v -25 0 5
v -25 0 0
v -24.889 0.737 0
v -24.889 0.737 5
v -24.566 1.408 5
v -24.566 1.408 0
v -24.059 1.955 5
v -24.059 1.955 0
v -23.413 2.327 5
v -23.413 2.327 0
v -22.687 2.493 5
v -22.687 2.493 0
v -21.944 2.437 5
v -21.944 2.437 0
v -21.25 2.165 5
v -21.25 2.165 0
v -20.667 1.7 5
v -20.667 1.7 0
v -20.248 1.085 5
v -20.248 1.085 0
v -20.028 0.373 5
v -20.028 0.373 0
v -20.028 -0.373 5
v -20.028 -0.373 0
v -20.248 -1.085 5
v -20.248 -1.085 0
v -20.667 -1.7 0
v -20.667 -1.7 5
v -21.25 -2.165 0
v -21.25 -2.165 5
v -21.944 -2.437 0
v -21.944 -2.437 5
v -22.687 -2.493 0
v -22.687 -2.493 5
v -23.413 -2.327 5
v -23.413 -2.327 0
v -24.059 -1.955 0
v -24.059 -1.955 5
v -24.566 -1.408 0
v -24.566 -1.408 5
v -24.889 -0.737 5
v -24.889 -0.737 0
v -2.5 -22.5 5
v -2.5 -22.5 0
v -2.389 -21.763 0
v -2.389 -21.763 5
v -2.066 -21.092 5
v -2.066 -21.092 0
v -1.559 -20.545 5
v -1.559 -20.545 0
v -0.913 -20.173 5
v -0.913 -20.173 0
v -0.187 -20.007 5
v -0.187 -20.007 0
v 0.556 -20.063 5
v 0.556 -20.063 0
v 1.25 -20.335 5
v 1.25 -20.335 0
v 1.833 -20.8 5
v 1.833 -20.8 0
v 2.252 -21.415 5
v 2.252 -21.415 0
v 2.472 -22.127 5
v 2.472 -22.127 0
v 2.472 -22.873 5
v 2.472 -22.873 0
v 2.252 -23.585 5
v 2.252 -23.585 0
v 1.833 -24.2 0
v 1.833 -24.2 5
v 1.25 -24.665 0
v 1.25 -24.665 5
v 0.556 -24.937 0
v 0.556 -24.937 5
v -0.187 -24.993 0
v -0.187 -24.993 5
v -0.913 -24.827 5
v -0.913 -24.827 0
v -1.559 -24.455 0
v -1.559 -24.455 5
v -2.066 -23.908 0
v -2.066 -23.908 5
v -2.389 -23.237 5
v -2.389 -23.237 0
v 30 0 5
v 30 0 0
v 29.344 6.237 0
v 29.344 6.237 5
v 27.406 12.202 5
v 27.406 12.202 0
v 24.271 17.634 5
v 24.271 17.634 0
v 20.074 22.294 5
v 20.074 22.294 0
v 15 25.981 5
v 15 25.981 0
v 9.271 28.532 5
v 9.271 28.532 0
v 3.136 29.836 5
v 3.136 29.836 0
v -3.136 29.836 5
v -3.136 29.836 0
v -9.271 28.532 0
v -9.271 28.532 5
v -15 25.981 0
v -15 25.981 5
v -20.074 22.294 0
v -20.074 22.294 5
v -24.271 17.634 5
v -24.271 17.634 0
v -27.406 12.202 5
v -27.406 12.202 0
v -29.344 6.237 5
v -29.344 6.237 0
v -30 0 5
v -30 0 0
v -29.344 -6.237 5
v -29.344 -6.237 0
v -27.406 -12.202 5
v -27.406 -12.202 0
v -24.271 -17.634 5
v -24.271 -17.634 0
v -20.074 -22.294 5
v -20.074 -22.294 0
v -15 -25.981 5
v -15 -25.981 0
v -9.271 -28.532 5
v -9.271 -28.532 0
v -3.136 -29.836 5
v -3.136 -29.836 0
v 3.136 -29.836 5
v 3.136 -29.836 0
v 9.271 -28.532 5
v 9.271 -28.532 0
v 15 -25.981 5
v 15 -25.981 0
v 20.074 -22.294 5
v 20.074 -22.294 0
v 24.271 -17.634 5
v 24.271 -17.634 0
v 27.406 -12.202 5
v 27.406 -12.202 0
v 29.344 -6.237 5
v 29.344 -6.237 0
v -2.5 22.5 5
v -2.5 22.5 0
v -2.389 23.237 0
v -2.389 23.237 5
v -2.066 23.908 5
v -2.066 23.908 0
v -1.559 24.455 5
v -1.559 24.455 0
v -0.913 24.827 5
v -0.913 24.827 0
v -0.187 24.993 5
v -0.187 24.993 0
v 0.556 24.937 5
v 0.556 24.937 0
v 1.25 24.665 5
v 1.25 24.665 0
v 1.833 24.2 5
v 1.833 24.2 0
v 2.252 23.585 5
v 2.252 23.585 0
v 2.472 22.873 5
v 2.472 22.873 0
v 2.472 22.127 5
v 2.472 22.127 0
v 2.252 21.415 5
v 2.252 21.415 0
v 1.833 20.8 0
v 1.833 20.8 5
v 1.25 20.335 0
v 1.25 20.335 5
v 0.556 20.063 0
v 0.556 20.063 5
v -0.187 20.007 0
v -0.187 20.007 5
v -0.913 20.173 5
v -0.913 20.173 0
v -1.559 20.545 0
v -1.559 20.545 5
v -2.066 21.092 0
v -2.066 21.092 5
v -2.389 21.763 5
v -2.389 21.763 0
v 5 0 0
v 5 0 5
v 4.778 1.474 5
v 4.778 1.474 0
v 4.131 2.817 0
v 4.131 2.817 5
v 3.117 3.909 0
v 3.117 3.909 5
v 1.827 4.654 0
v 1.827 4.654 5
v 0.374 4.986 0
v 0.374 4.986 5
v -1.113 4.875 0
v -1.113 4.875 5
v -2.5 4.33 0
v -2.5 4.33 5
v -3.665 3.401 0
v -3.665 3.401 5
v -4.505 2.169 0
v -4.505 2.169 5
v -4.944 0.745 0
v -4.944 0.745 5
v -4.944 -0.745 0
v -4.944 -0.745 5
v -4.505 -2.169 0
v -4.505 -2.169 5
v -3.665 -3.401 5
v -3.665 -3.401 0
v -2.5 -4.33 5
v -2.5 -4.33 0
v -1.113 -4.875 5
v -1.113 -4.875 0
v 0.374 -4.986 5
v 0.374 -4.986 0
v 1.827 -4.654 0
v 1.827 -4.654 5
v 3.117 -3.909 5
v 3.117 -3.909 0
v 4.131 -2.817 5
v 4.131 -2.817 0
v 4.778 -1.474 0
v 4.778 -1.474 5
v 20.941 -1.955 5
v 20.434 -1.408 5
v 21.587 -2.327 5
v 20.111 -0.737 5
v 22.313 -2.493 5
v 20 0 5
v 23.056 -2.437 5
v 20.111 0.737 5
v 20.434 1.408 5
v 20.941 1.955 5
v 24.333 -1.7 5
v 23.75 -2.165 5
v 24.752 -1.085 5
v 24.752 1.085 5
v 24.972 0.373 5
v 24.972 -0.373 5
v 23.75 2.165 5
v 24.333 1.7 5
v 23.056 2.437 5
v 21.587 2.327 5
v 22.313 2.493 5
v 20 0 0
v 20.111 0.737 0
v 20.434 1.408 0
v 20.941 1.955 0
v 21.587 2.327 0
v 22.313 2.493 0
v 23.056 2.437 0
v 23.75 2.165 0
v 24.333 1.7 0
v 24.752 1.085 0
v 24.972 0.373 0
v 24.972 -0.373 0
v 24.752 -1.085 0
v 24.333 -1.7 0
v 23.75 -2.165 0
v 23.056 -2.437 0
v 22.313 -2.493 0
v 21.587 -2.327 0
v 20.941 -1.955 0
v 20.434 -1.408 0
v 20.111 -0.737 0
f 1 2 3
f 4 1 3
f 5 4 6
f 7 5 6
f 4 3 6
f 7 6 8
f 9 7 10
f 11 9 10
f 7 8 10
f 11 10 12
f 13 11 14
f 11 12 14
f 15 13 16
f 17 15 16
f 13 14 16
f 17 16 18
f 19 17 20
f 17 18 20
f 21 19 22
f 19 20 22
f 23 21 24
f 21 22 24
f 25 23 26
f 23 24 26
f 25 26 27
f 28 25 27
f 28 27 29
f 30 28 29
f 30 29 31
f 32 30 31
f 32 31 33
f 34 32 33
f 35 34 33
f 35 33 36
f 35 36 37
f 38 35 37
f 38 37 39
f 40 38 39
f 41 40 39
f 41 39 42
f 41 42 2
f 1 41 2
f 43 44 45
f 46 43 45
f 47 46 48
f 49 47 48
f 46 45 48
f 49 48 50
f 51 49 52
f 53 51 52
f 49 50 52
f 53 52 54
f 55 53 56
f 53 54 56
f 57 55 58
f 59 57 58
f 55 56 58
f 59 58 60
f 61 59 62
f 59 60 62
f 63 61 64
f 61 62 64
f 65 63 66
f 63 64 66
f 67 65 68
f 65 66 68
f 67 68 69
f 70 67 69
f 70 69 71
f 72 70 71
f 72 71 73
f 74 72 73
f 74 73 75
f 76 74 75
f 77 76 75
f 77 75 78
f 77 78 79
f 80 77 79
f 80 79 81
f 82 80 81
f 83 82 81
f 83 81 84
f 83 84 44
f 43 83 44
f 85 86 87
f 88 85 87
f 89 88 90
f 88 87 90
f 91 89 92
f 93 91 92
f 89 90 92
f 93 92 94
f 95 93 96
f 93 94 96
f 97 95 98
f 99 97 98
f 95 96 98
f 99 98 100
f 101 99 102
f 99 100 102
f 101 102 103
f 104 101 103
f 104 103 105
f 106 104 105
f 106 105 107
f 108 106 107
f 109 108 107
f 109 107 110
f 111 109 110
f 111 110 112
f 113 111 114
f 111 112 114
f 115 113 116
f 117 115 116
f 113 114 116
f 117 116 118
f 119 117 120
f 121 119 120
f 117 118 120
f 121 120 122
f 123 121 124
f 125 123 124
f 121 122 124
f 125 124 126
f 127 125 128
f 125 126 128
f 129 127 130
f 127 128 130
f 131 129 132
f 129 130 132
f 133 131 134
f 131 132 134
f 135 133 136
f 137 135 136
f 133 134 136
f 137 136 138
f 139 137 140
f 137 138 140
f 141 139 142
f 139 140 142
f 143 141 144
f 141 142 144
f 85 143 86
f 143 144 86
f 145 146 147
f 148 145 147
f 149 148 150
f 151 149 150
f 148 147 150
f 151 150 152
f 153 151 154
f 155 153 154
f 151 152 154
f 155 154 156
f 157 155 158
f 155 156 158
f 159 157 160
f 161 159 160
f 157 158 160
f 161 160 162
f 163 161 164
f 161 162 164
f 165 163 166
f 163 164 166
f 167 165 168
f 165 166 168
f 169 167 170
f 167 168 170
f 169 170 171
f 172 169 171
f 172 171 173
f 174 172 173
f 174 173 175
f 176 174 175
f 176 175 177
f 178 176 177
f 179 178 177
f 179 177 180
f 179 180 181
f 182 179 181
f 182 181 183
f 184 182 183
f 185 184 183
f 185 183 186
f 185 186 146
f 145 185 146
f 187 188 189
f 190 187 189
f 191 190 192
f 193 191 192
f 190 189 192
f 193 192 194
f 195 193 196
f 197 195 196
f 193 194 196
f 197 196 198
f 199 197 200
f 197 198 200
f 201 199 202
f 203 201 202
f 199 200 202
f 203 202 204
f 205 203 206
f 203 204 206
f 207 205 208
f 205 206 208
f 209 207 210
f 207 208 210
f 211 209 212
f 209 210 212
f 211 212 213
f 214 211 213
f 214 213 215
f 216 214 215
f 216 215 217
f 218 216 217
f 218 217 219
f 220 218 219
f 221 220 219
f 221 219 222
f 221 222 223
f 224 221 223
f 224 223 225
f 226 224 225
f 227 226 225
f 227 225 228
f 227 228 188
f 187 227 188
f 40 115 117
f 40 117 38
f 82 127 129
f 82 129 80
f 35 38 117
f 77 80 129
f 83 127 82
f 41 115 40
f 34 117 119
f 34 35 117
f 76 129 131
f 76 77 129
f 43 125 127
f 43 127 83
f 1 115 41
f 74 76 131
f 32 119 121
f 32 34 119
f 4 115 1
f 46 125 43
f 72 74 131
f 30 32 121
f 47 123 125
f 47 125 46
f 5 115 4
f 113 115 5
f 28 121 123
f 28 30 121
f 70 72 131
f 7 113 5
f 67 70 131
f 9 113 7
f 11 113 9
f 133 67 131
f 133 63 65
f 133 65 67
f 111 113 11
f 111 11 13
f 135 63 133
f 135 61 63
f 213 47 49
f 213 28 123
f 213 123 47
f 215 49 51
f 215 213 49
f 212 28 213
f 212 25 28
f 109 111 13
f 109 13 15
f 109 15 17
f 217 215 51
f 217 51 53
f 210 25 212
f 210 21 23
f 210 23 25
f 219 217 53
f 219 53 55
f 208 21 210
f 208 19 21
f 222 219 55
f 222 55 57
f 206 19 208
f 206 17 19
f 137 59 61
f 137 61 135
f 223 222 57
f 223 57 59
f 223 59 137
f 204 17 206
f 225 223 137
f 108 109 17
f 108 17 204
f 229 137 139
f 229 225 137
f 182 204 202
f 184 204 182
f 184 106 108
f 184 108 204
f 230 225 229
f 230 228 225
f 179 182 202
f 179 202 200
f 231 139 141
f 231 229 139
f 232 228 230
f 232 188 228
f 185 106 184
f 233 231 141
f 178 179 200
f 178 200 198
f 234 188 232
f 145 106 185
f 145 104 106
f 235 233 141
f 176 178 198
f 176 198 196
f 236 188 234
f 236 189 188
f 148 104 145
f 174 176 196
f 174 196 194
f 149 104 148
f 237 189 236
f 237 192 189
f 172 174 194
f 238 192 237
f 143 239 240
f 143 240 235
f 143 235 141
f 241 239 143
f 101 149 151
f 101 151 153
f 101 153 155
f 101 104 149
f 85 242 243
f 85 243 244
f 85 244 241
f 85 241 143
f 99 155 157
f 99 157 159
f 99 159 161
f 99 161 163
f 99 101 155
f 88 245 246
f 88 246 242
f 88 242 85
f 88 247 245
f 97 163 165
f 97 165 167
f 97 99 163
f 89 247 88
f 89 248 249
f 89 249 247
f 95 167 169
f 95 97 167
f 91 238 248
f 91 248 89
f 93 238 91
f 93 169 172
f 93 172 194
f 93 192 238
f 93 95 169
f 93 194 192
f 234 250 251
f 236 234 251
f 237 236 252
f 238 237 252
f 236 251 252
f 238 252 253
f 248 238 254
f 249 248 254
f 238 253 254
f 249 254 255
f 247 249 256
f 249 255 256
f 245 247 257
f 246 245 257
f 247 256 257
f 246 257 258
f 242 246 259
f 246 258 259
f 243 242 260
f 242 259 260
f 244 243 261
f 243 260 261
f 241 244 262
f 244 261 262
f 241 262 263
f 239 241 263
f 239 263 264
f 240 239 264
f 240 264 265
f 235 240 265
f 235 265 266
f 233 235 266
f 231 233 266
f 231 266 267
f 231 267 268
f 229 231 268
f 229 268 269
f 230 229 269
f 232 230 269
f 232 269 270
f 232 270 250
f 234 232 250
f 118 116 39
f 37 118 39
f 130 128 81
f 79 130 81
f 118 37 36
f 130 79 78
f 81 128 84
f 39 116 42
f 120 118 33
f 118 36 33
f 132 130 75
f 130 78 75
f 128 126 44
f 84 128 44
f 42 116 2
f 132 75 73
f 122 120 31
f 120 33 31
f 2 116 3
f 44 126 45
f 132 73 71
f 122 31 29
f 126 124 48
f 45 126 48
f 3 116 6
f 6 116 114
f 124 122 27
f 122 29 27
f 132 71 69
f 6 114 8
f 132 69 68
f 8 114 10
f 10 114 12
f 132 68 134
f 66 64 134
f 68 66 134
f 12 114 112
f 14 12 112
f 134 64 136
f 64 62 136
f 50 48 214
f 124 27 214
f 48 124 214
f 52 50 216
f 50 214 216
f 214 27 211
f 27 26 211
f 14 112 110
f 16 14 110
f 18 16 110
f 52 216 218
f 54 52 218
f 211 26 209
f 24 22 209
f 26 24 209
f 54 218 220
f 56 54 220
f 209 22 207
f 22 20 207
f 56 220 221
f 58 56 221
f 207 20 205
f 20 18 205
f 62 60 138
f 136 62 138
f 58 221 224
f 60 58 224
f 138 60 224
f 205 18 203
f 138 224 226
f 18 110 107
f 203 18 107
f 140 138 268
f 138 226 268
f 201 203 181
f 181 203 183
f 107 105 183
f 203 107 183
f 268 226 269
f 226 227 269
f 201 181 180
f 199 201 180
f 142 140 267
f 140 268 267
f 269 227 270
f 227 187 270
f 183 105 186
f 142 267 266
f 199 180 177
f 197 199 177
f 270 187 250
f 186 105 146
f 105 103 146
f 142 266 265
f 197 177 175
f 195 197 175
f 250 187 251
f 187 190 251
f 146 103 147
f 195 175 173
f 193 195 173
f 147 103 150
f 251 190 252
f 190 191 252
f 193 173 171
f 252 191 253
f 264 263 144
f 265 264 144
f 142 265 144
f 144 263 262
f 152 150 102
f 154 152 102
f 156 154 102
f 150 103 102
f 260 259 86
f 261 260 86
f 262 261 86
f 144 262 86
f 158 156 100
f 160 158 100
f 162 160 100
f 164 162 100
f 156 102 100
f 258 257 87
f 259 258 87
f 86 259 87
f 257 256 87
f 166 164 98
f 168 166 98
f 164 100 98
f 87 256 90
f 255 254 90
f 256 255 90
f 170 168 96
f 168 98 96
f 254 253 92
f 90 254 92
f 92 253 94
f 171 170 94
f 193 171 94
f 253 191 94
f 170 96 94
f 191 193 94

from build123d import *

# Parameters (mm, degrees)
SKETCH_1_R             = 30
EXTRUDE_1_DEPTH        = 5
SKETCH_2_R             = 5
CUT_EXTRUDE_1_DEPTH    = 93
HOLE_WIZARD_M6_1_D     = 5
HOLE_WIZARD_M6_1_DEPTH = 15
HOLE_WIZARD_M6_1_TIP   = 1.502151548


with BuildPart() as part:
    # 草图1 → 凸台-拉伸1 (new body)
    with BuildSketch(Plane.XY):
        Circle(SKETCH_1_R)
    extrude(amount=EXTRUDE_1_DEPTH)

    # 草图2 → 切除-拉伸1 (cut)
    with BuildSketch(Plane.XY.offset(5)):
        Circle(SKETCH_2_R)
    extrude(amount=-CUT_EXTRUDE_1_DEPTH, mode=Mode.SUBTRACT)

    # M6 螺纹孔1
    with Locations(Plane.XY.offset(5)):
        with Locations((22.5, 0), (0, 22.5), (0, -22.5), (-22.5, 0)):
            Hole(HOLE_WIZARD_M6_1_D / 2, depth=HOLE_WIZARD_M6_1_DEPTH)
            with Locations((0, 0, -(HOLE_WIZARD_M6_1_DEPTH + HOLE_WIZARD_M6_1_TIP / 2))):  # 118° drill point
                Cone(0, HOLE_WIZARD_M6_1_D / 2, HOLE_WIZARD_M6_1_TIP, mode=Mode.SUBTRACT)


solid = part.part
